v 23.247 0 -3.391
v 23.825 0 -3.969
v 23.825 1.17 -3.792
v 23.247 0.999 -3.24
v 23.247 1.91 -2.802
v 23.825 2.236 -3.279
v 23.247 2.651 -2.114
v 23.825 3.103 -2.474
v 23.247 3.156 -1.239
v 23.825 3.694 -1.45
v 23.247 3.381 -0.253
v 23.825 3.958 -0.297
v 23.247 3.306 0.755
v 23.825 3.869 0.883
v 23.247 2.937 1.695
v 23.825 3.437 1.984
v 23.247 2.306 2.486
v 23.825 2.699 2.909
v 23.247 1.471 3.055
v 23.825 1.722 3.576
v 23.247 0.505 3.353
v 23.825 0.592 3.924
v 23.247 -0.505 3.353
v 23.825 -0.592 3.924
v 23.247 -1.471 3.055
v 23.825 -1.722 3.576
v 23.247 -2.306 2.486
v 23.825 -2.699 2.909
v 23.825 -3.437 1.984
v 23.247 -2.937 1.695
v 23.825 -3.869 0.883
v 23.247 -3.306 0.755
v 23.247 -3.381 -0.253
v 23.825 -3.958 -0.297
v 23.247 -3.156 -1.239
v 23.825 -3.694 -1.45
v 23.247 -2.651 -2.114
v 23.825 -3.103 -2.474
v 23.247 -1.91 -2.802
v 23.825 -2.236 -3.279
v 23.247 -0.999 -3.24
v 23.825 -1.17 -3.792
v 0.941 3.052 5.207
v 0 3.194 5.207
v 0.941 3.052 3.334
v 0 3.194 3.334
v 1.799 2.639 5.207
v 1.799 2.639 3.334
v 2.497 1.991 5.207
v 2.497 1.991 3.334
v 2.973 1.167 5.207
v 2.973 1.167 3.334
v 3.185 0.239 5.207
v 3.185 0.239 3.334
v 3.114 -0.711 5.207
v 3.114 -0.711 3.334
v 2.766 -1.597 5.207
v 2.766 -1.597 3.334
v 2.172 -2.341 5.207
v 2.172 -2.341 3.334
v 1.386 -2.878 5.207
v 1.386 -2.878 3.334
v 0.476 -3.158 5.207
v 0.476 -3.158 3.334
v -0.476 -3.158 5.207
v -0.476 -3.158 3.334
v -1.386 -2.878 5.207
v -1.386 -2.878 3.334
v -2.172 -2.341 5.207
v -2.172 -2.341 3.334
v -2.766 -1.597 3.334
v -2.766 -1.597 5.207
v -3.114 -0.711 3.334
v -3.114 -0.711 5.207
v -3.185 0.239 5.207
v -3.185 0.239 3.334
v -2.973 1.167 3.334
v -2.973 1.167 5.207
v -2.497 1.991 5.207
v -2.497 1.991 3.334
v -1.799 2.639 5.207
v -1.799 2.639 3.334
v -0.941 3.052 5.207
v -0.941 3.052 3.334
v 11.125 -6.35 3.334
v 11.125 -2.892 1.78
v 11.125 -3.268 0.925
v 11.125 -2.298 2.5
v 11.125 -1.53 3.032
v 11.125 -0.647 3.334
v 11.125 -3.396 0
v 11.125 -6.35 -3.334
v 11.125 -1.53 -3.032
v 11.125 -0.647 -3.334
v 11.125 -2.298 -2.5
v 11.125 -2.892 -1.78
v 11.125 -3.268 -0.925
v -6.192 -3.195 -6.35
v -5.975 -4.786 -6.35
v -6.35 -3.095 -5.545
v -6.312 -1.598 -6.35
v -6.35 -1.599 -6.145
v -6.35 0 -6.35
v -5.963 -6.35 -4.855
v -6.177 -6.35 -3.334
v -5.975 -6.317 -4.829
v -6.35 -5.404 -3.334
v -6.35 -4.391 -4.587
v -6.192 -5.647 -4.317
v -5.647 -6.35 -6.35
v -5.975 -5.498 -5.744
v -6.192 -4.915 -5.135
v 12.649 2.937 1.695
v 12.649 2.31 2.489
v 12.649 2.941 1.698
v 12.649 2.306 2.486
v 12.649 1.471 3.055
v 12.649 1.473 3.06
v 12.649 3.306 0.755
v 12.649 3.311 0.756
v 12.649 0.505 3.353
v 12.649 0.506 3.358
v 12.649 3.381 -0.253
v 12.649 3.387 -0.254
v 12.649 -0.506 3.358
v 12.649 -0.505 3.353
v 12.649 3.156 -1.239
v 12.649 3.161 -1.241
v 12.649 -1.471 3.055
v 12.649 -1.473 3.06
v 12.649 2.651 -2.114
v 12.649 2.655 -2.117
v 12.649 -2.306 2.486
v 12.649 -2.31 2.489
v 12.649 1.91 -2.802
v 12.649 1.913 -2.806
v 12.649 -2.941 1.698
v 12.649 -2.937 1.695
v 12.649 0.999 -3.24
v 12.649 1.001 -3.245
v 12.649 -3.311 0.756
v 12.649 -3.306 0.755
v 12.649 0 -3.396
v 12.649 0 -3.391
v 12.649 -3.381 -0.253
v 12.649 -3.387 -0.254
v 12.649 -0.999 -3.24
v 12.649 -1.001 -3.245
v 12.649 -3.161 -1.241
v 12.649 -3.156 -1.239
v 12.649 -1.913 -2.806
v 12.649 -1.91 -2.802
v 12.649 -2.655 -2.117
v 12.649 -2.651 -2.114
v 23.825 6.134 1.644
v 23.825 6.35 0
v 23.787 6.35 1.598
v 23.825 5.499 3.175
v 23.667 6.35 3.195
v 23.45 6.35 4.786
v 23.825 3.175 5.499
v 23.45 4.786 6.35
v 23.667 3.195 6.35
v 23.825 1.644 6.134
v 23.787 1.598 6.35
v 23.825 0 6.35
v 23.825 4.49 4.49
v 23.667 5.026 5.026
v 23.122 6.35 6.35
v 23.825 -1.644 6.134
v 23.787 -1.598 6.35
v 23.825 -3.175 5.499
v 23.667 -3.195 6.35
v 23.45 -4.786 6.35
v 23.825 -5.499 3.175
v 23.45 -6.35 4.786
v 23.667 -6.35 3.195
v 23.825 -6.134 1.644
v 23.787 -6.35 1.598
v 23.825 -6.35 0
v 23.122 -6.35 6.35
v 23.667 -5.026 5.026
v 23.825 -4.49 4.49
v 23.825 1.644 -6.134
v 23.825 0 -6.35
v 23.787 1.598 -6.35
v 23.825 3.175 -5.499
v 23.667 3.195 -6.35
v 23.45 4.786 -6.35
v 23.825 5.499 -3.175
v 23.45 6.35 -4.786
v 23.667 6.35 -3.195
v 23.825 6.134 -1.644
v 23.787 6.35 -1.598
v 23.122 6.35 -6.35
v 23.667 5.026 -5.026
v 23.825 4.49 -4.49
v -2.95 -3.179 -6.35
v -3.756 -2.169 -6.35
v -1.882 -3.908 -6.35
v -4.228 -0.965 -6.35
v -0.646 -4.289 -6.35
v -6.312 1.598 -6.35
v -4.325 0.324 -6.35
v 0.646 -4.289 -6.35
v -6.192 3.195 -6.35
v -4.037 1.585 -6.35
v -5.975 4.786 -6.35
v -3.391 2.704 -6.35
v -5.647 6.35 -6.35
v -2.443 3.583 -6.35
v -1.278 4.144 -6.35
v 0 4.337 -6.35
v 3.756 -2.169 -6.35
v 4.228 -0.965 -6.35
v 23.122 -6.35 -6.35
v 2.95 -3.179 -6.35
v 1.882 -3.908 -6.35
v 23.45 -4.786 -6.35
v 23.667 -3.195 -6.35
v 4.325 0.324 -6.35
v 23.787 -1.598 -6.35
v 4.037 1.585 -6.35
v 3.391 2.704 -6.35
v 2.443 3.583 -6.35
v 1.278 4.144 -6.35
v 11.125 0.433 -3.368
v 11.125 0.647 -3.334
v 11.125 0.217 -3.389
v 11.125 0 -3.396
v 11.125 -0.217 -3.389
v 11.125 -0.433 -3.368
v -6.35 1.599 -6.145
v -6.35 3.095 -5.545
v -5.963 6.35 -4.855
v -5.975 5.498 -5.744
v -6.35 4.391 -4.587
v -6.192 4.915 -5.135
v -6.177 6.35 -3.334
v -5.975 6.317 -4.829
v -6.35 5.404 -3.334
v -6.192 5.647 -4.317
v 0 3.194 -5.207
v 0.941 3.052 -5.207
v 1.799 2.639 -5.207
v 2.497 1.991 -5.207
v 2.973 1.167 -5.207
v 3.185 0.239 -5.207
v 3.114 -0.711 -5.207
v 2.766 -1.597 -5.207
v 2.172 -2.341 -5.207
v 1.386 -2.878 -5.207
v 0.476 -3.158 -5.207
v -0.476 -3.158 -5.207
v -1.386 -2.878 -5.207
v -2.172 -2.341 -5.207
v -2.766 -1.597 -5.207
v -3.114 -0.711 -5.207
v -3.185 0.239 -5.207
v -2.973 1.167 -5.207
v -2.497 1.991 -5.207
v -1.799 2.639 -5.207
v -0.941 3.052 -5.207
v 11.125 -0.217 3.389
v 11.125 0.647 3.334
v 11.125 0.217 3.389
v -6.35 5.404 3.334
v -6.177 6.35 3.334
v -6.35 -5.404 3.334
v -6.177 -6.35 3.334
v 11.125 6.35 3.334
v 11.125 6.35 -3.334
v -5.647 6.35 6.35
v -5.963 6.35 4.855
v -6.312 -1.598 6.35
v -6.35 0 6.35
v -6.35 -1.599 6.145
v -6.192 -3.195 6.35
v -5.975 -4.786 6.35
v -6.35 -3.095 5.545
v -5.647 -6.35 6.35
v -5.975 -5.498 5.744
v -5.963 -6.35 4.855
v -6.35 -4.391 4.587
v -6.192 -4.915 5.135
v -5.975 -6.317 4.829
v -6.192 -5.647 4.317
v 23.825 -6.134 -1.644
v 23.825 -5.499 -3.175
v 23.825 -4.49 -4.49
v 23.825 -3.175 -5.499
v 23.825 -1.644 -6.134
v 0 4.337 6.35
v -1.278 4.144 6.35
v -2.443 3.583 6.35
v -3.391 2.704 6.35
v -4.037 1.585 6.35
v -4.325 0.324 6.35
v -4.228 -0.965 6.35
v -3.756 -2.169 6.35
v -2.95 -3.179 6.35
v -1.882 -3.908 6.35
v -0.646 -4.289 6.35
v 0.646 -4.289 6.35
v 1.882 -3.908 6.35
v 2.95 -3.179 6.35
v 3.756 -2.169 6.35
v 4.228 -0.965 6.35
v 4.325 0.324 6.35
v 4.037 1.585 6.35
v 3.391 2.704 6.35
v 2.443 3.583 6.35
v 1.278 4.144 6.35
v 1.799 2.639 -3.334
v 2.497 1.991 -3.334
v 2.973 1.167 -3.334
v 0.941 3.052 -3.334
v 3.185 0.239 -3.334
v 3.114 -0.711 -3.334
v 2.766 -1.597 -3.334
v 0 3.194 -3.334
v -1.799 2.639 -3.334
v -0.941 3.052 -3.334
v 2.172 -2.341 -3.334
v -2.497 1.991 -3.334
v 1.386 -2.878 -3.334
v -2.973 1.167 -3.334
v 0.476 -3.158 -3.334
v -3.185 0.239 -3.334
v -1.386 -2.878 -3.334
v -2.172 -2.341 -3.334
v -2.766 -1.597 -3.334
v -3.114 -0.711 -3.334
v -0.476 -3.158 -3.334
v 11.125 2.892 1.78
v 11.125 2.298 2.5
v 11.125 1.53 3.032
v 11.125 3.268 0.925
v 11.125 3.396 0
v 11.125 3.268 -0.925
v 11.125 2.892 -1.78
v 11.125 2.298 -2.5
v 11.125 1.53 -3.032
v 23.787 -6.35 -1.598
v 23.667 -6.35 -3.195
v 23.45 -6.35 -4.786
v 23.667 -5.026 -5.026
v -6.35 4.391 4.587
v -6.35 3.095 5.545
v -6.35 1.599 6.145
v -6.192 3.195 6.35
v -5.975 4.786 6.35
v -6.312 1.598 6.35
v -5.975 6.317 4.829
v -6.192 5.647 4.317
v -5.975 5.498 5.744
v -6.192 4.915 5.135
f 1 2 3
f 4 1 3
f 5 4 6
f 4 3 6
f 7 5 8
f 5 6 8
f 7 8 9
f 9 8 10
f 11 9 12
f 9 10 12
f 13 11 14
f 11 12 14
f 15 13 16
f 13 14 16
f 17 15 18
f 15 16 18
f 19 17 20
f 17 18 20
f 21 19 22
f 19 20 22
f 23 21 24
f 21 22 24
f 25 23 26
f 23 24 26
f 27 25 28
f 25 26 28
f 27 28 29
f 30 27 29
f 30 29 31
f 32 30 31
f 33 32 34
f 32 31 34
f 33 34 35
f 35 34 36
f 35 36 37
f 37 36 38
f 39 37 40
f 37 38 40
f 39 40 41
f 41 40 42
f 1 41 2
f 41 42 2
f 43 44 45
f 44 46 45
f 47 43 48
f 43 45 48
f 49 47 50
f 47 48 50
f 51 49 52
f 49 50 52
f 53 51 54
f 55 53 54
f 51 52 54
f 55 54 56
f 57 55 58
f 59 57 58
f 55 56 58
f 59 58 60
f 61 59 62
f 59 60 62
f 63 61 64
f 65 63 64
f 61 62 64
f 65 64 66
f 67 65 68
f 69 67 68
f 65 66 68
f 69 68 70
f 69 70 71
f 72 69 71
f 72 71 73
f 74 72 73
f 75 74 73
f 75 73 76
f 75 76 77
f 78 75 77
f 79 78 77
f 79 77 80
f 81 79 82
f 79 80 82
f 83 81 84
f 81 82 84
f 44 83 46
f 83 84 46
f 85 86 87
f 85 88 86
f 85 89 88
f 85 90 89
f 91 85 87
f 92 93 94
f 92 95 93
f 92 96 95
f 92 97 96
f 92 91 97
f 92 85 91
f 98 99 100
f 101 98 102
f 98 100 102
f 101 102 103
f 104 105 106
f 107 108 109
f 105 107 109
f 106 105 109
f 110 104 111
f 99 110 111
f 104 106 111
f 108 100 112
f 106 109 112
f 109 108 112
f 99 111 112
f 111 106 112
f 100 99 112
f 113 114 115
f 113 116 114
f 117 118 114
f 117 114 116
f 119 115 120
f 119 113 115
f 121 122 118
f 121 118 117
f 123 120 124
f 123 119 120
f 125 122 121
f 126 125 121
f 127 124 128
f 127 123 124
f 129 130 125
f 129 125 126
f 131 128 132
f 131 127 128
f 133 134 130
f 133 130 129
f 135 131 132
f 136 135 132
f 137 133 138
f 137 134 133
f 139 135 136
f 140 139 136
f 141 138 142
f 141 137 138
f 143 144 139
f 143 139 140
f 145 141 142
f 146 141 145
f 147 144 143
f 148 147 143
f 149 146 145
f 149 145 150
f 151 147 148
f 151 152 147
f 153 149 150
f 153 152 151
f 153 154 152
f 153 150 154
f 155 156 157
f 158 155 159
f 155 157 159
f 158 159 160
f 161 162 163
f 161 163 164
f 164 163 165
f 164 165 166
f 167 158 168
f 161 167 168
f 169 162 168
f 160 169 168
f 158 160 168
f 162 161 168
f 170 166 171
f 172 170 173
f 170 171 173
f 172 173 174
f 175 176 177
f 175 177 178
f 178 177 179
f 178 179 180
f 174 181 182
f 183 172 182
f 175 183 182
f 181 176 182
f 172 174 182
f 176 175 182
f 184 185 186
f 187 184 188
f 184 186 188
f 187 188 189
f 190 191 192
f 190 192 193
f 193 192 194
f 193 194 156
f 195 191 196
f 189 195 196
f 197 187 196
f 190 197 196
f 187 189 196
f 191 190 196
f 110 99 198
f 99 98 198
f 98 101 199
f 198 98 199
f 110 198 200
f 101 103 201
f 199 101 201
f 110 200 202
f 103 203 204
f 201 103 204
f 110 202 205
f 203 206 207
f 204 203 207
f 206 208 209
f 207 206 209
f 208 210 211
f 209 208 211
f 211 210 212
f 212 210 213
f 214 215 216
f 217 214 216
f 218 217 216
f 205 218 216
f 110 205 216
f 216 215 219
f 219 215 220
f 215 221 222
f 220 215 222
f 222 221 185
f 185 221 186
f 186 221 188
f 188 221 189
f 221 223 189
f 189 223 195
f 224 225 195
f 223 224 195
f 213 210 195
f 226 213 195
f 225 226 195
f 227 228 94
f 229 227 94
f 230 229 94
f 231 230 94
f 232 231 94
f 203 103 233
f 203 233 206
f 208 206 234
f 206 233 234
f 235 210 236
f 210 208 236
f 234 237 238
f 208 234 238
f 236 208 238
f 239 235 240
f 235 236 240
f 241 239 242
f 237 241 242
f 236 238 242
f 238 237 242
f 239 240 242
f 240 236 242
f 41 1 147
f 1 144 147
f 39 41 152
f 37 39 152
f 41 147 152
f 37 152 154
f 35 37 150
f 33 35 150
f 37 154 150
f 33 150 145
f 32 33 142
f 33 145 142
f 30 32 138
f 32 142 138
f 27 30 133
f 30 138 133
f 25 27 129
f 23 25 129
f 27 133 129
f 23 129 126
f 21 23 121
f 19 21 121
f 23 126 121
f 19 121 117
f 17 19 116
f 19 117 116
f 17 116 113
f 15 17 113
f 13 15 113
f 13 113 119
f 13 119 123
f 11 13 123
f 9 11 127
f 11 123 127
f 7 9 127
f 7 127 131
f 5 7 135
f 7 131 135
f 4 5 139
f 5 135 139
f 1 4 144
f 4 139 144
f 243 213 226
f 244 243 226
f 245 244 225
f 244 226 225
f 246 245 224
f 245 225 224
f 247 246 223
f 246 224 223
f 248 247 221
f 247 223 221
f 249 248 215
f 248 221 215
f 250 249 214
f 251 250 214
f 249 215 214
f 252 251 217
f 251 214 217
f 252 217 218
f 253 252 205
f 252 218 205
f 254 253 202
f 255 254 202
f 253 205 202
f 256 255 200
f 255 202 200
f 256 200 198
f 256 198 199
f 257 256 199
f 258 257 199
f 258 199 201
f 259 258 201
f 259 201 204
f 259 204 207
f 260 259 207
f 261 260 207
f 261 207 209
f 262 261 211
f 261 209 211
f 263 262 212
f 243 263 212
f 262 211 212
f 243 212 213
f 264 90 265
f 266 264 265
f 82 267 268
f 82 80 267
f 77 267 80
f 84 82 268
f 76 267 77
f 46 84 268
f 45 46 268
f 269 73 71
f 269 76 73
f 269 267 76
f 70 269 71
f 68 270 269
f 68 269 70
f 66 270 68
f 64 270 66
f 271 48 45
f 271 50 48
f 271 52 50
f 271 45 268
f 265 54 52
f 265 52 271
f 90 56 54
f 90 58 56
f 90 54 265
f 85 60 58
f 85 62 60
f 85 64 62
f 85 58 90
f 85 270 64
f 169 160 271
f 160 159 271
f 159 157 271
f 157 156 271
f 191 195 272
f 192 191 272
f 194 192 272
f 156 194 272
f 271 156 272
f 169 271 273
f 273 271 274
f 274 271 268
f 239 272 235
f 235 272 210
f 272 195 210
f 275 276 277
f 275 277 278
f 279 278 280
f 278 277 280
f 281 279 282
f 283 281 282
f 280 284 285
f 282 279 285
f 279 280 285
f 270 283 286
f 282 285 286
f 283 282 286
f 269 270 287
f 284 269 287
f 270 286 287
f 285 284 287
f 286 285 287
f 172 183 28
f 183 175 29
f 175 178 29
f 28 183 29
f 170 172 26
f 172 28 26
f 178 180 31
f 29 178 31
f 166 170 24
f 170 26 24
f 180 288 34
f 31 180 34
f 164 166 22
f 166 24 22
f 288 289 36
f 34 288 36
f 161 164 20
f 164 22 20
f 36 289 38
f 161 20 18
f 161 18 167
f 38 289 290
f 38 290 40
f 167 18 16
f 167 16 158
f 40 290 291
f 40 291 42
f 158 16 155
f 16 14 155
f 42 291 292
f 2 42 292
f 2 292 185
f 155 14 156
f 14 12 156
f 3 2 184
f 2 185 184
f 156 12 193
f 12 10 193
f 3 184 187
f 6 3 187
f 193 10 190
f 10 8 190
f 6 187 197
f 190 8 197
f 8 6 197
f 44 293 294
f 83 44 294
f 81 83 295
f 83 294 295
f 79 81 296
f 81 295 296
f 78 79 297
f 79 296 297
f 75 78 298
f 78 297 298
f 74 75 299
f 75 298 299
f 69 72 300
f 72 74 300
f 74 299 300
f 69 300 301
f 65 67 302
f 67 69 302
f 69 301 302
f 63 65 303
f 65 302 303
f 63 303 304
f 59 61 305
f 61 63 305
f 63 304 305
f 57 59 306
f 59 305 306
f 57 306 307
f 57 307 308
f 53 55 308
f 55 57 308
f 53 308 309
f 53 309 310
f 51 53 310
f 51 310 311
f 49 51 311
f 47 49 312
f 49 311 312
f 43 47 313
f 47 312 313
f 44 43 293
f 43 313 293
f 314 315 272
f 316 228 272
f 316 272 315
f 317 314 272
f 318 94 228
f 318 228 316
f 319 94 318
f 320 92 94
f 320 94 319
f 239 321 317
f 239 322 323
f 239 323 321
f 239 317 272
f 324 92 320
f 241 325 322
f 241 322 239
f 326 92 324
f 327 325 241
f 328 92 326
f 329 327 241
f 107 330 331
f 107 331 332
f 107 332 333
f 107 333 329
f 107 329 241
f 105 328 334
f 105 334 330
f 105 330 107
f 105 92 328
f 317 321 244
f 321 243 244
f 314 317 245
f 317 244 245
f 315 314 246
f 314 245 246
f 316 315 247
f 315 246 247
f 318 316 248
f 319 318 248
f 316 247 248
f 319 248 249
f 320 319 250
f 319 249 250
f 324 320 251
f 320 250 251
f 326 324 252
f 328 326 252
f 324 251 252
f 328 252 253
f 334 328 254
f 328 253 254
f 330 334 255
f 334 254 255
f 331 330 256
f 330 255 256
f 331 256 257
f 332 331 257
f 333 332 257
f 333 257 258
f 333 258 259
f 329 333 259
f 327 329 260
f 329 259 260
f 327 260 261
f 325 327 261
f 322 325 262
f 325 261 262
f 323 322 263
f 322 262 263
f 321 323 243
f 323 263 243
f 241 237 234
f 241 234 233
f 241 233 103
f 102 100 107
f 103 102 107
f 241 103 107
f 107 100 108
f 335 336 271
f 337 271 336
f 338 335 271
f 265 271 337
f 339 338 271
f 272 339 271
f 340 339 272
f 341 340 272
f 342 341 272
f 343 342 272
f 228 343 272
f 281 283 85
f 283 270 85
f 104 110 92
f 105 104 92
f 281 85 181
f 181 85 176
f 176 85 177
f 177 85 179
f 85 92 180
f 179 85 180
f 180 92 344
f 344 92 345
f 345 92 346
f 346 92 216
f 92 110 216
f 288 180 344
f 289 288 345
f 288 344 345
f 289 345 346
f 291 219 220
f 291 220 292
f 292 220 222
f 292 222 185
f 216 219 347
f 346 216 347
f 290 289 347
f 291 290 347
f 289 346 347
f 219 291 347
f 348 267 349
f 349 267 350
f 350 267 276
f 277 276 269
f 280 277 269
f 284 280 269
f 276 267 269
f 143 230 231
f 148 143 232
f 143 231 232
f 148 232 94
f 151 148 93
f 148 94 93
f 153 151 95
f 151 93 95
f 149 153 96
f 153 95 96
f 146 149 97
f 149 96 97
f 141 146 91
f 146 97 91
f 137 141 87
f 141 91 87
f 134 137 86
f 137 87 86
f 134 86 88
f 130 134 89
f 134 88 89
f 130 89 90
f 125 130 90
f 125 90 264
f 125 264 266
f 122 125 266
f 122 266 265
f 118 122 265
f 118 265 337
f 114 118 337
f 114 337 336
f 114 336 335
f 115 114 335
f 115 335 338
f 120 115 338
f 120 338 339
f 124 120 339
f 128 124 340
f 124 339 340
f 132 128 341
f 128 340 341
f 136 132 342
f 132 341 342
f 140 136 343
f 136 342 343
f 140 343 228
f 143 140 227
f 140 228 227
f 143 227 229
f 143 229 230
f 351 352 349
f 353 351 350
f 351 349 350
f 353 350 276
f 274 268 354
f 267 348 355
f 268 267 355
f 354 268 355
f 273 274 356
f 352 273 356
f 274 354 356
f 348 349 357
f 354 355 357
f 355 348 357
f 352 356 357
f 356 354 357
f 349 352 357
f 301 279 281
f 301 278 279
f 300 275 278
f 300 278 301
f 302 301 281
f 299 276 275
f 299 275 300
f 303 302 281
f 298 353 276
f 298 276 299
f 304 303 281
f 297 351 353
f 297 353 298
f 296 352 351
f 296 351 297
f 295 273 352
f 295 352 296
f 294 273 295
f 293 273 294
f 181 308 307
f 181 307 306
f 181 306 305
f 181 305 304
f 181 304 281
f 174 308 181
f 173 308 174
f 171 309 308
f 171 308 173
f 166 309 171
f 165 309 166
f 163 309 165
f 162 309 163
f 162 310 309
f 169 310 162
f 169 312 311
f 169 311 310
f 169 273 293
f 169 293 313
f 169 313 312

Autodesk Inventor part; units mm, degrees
sketch "Sketch_1" plane through (0, 0, 0) normal (0, 0, 1) x (1, 0, 0)
  line L0 (-6.35, 6.35) -> (-6.35, -6.35)
  line L1 (-6.35, -6.35) -> (23.8252, -6.35)
  line L2 (23.8252, -6.35) -> (23.8252, 6.35)
  line L3 (23.8252, 6.35) -> (-6.35, 6.35)
extrude "Extrusion1" add sketch "Sketch_1" along normal mid plane 12.7
sketch "Sketch_2" plane through (0, 0, 0) normal (0, 1, 0) x (-1, 0, 0)
  line L0 (6.35, -3.3338) -> (6.35, 3.3338)
  line L1 (6.35, 3.3338) -> (-11.1252, 3.3338)
  line L2 (-11.1252, 3.3338) -> (-11.1252, -3.3338)
  line L3 (-11.1252, -3.3338) -> (6.35, -3.3338)
extrude "Extrusion2" cut sketch "Sketch_2" along normal mid plane 12.7
sketch "Sketch3" plane through (23.8252, -6.35, 6.35) normal (1, 0, 0) x (0, 0, -1)
  point P0 (6.35, 6.35)
hole "Hole1" at (23.8252, 0, 0) direction (-1, 0, 0) diameter 6.7818 depth 11.176 countersink diameter 7.9375 countersink angle 90 thread size "5/16-24 UNF" class "2B" standard "ANSI Unified Screw Threads"
sketch "Sketch4" plane through (12.6492, 0, 0) normal (1, 0, 0) x (0, 0, -1)
  point P0 (0, 0)
hole "Hole2" at (12.6492, 0, 0) direction (-1, 0, 0) diameter 6.792 depth 1.524
sketch "Sketch_5" plane through (0, 0, 0) normal (1, 0, 0) x (0, 1, 0)
  line L0 (0, -6.35) -> (0, 6.35)
  line L1 (0, 6.35) -> (4.3371, 6.35)
  line L2 (4.3371, 6.35) -> (3.194, 5.207)
  line L3 (3.194, 5.207) -> (3.194, -5.207)
  line L4 (3.194, -5.207) -> (4.3371, -6.35)
  line L5 (4.3371, -6.35) -> (0, -6.35)
  line L6 (0, -6.35) -> (0, 6.35)
revolve "Revolution1" cut sketch "Sketch_5" angle 360 about axis through (0, 0, -6.35) along (0, 0, -1)
sketch "Sketch_9" plane through (0, 0, 0) normal (0, 0, 1) x (1, 0, 0)
  line L0 (30.1752, 0) -> (23.8252, 0)
  line L1 (23.8252, 0) -> (23.8252, 6.35)
  arc A0 (23.8252, 6.35) -> (21.2852, 12.7) centre (6.6802, 3.175) ccw
  line L2 (21.2852, 12.7) -> (30.1752, 12.7)
  line L3 (30.1752, 12.7) -> (30.1752, 0)
  line L4 (30.1752, 0) -> (23.8252, 0)
revolve "Revolution2" cut sketch "Sketch_9" angle 360 about axis through (30.1752, 0, 0) along (1, 0, 0)
sketch "Sketch_10" plane through (0, 0, 0) normal (0, 0, 1) x (1, 0, 0)
  line L0 (-6.35, 0) -> (-12.7, 0)
  line L1 (-12.7, 0) -> (-12.7, 12.7)
  line L2 (-12.7, 12.7) -> (-3.81, 12.7)
  arc A0 (-3.81, 12.7) -> (-6.35, 6.35) centre (10.795, 3.175) ccw
  line L3 (-6.35, 6.35) -> (-6.35, 0)
  line L4 (-6.35, 0) -> (-12.7, 0)
revolve "Revolution3" cut sketch "Sketch_10" angle 360 about axis through (-6.35, 0, 0) along (1, 0, 0)
ref_plane "dummy_XY" through (0, 0, 0) normal (0, 0, 1) x (1, 0, 0)
ref_plane "dummy_YZ" through (0, 0, 0) normal (1, 0, 0) x (0, 1, 0)
ref_plane "dummy_ZX" through (0, 0, 0) normal (0, 1, 0) x (0, 0, 1)
ref_plane "h1_XY" through (-6.35, 6.35, 0) normal (0, 0, 1) x (1, 0, 0)
ref_plane "h1_YZ" through (-6.35, 6.35, 0) normal (1, 0, 0) x (0, 1, 0)
ref_plane "h1_ZX" through (-6.35, 6.35, 0) normal (0, 1, 0) x (0, 0, 1)
ref_plane "h2_XY" through (-6.35, -6.35, 0) normal (0, 0, 1) x (1, 0, 0)
ref_plane "h2_YZ" through (-6.35, -6.35, 0) normal (1, 0, 0) x (0, 1, 0)
ref_plane "h2_ZX" through (-6.35, -6.35, 0) normal (0, 1, 0) x (0, 0, 1)
ref_plane "l1_XY" through (23.8252, 6.35, 0) normal (0, 0, 1) x (1, 0, 0)
ref_plane "l1_YZ" through (23.8252, 6.35, 0) normal (1, 0, 0) x (0, 1, 0)
ref_plane "l1_ZX" through (23.8252, 6.35, 0) normal (0, 1, 0) x (0, 0, 1)
ref_plane "l11_XY" through (23.8252, 6.35, 0) normal (0, 0, 1) x (1, 0, 0)
ref_plane "l11_YZ" through (23.8252, 6.35, 0) normal (1, 0, 0) x (0, 1, 0)
ref_plane "l11_ZX" through (23.8252, 6.35, 0) normal (0, 1, 0) x (0, 0, 1)
ref_plane "l12_XY" through (0, 6.35, 0) normal (0, 0, 1) x (1, 0, 0)
ref_plane "l12_YZ" through (0, 6.35, 0) normal (1, 0, 0) x (0, 1, 0)
ref_plane "l12_ZX" through (0, 6.35, 0) normal (0, 1, 0) x (0, 0, 1)
ref_plane "l2_XY" through (-6.35, 6.35, 0) normal (0, 0, 1) x (1, 0, 0)
ref_plane "l2_YZ" through (-6.35, 6.35, 0) normal (1, 0, 0) x (0, 1, 0)
ref_plane "l2_ZX" through (-6.35, 6.35, 0) normal (0, 1, 0) x (0, 0, 1)
ref_plane "l21_XY" through (23.8252, 0, 0) normal (0, 1, 0) x (1, 0, 0)
ref_plane "l21_YZ" through (23.8252, 0, 0) normal (1, 0, 0) x (0, 0, -1)
ref_plane "l21_ZX" through (23.8252, 0, 0) normal (0, 0, -1) x (0, 1, 0)
ref_plane "l22_XY" through (11.1252, 0, 0) normal (0, 1, 0) x (1, 0, 0)
ref_plane "l22_YZ" through (11.1252, 0, 0) normal (1, 0, 0) x (0, 0, -1)
ref_plane "l22_ZX" through (11.1252, 0, 0) normal (0, 0, -1) x (0, 1, 0)
ref_plane "piston_rod_clevis_XY" through (23.8252, 0, 0) normal (1, 0, 0) x (0, 0, -1)
ref_plane "piston_rod_clevis_YZ" through (23.8252, 0, 0) normal (0, 0, -1) x (0, 1, 0)
ref_plane "piston_rod_clevis_ZX" through (23.8252, 0, 0) normal (0, 1, 0) x (1, 0, 0)
ref_plane "rod_clevis_body_XY" through (0, 0, 0) normal (0, 0, 1) x (1, 0, 0)
ref_plane "rod_clevis_body_YZ" through (0, 0, 0) normal (1, 0, 0) x (0, 1, 0)
ref_plane "rod_clevis_body_ZX" through (0, 0, 0) normal (0, 1, 0) x (0, 0, 1)
ref_plane "th1_XY" through (23.8252, 3.9688, 0) normal (0, 0, 1) x (1, 0, 0)
ref_plane "th1_YZ" through (23.8252, 3.9688, 0) normal (1, 0, 0) x (0, 1, 0)
ref_plane "th1_ZX" through (23.8252, 3.9688, 0) normal (0, 1, 0) x (0, 0, 1)
ref_plane "th2_XY" through (23.8252, -3.9688, 0) normal (0, 0, 1) x (1, 0, 0)
ref_plane "th2_YZ" through (23.8252, -3.9688, 0) normal (1, 0, 0) x (0, 1, 0)
ref_plane "th2_ZX" through (23.8252, -3.9688, 0) normal (0, 1, 0) x (0, 0, 1)
ref_plane "to_cylinder_XY" through (11.1252, 0, 0) normal (1, 0, 0) x (0, 0, -1)
ref_plane "to_cylinder_YZ" through (11.1252, 0, 0) normal (0, 0, -1) x (0, 1, 0)
ref_plane "to_cylinder_ZX" through (11.1252, 0, 0) normal (0, 1, 0) x (1, 0, 0)
ref_plane "w1_XY" through (23.8252, 0, -6.35) normal (0, 1, 0) x (1, 0, 0)
ref_plane "w1_YZ" through (23.8252, 0, -6.35) normal (1, 0, 0) x (0, 0, -1)
ref_plane "w1_ZX" through (23.8252, 0, -6.35) normal (0, 0, -1) x (0, 1, 0)
ref_plane "w11_XY" through (-6.35, 0, -3.3338) normal (0, 1, 0) x (1, 0, 0)
ref_plane "w11_YZ" through (-6.35, 0, -3.3338) normal (1, 0, 0) x (0, 0, -1)
ref_plane "w11_ZX" through (-6.35, 0, -3.3338) normal (0, 0, -1) x (0, 1, 0)
ref_plane "w12_XY" through (-6.35, 0, 3.3338) normal (0, 1, 0) x (1, 0, 0)
ref_plane "w12_YZ" through (-6.35, 0, 3.3338) normal (1, 0, 0) x (0, 0, -1)
ref_plane "w12_ZX" through (-6.35, 0, 3.3338) normal (0, 0, -1) x (0, 1, 0)
ref_plane "w2_XY" through (23.8252, 0, 6.35) normal (0, 1, 0) x (1, 0, 0)
ref_plane "w2_YZ" through (23.8252, 0, 6.35) normal (1, 0, 0) x (0, 0, -1)
ref_plane "w2_ZX" through (23.8252, 0, 6.35) normal (0, 0, -1) x (0, 1, 0)
properties part number "D-14059"
